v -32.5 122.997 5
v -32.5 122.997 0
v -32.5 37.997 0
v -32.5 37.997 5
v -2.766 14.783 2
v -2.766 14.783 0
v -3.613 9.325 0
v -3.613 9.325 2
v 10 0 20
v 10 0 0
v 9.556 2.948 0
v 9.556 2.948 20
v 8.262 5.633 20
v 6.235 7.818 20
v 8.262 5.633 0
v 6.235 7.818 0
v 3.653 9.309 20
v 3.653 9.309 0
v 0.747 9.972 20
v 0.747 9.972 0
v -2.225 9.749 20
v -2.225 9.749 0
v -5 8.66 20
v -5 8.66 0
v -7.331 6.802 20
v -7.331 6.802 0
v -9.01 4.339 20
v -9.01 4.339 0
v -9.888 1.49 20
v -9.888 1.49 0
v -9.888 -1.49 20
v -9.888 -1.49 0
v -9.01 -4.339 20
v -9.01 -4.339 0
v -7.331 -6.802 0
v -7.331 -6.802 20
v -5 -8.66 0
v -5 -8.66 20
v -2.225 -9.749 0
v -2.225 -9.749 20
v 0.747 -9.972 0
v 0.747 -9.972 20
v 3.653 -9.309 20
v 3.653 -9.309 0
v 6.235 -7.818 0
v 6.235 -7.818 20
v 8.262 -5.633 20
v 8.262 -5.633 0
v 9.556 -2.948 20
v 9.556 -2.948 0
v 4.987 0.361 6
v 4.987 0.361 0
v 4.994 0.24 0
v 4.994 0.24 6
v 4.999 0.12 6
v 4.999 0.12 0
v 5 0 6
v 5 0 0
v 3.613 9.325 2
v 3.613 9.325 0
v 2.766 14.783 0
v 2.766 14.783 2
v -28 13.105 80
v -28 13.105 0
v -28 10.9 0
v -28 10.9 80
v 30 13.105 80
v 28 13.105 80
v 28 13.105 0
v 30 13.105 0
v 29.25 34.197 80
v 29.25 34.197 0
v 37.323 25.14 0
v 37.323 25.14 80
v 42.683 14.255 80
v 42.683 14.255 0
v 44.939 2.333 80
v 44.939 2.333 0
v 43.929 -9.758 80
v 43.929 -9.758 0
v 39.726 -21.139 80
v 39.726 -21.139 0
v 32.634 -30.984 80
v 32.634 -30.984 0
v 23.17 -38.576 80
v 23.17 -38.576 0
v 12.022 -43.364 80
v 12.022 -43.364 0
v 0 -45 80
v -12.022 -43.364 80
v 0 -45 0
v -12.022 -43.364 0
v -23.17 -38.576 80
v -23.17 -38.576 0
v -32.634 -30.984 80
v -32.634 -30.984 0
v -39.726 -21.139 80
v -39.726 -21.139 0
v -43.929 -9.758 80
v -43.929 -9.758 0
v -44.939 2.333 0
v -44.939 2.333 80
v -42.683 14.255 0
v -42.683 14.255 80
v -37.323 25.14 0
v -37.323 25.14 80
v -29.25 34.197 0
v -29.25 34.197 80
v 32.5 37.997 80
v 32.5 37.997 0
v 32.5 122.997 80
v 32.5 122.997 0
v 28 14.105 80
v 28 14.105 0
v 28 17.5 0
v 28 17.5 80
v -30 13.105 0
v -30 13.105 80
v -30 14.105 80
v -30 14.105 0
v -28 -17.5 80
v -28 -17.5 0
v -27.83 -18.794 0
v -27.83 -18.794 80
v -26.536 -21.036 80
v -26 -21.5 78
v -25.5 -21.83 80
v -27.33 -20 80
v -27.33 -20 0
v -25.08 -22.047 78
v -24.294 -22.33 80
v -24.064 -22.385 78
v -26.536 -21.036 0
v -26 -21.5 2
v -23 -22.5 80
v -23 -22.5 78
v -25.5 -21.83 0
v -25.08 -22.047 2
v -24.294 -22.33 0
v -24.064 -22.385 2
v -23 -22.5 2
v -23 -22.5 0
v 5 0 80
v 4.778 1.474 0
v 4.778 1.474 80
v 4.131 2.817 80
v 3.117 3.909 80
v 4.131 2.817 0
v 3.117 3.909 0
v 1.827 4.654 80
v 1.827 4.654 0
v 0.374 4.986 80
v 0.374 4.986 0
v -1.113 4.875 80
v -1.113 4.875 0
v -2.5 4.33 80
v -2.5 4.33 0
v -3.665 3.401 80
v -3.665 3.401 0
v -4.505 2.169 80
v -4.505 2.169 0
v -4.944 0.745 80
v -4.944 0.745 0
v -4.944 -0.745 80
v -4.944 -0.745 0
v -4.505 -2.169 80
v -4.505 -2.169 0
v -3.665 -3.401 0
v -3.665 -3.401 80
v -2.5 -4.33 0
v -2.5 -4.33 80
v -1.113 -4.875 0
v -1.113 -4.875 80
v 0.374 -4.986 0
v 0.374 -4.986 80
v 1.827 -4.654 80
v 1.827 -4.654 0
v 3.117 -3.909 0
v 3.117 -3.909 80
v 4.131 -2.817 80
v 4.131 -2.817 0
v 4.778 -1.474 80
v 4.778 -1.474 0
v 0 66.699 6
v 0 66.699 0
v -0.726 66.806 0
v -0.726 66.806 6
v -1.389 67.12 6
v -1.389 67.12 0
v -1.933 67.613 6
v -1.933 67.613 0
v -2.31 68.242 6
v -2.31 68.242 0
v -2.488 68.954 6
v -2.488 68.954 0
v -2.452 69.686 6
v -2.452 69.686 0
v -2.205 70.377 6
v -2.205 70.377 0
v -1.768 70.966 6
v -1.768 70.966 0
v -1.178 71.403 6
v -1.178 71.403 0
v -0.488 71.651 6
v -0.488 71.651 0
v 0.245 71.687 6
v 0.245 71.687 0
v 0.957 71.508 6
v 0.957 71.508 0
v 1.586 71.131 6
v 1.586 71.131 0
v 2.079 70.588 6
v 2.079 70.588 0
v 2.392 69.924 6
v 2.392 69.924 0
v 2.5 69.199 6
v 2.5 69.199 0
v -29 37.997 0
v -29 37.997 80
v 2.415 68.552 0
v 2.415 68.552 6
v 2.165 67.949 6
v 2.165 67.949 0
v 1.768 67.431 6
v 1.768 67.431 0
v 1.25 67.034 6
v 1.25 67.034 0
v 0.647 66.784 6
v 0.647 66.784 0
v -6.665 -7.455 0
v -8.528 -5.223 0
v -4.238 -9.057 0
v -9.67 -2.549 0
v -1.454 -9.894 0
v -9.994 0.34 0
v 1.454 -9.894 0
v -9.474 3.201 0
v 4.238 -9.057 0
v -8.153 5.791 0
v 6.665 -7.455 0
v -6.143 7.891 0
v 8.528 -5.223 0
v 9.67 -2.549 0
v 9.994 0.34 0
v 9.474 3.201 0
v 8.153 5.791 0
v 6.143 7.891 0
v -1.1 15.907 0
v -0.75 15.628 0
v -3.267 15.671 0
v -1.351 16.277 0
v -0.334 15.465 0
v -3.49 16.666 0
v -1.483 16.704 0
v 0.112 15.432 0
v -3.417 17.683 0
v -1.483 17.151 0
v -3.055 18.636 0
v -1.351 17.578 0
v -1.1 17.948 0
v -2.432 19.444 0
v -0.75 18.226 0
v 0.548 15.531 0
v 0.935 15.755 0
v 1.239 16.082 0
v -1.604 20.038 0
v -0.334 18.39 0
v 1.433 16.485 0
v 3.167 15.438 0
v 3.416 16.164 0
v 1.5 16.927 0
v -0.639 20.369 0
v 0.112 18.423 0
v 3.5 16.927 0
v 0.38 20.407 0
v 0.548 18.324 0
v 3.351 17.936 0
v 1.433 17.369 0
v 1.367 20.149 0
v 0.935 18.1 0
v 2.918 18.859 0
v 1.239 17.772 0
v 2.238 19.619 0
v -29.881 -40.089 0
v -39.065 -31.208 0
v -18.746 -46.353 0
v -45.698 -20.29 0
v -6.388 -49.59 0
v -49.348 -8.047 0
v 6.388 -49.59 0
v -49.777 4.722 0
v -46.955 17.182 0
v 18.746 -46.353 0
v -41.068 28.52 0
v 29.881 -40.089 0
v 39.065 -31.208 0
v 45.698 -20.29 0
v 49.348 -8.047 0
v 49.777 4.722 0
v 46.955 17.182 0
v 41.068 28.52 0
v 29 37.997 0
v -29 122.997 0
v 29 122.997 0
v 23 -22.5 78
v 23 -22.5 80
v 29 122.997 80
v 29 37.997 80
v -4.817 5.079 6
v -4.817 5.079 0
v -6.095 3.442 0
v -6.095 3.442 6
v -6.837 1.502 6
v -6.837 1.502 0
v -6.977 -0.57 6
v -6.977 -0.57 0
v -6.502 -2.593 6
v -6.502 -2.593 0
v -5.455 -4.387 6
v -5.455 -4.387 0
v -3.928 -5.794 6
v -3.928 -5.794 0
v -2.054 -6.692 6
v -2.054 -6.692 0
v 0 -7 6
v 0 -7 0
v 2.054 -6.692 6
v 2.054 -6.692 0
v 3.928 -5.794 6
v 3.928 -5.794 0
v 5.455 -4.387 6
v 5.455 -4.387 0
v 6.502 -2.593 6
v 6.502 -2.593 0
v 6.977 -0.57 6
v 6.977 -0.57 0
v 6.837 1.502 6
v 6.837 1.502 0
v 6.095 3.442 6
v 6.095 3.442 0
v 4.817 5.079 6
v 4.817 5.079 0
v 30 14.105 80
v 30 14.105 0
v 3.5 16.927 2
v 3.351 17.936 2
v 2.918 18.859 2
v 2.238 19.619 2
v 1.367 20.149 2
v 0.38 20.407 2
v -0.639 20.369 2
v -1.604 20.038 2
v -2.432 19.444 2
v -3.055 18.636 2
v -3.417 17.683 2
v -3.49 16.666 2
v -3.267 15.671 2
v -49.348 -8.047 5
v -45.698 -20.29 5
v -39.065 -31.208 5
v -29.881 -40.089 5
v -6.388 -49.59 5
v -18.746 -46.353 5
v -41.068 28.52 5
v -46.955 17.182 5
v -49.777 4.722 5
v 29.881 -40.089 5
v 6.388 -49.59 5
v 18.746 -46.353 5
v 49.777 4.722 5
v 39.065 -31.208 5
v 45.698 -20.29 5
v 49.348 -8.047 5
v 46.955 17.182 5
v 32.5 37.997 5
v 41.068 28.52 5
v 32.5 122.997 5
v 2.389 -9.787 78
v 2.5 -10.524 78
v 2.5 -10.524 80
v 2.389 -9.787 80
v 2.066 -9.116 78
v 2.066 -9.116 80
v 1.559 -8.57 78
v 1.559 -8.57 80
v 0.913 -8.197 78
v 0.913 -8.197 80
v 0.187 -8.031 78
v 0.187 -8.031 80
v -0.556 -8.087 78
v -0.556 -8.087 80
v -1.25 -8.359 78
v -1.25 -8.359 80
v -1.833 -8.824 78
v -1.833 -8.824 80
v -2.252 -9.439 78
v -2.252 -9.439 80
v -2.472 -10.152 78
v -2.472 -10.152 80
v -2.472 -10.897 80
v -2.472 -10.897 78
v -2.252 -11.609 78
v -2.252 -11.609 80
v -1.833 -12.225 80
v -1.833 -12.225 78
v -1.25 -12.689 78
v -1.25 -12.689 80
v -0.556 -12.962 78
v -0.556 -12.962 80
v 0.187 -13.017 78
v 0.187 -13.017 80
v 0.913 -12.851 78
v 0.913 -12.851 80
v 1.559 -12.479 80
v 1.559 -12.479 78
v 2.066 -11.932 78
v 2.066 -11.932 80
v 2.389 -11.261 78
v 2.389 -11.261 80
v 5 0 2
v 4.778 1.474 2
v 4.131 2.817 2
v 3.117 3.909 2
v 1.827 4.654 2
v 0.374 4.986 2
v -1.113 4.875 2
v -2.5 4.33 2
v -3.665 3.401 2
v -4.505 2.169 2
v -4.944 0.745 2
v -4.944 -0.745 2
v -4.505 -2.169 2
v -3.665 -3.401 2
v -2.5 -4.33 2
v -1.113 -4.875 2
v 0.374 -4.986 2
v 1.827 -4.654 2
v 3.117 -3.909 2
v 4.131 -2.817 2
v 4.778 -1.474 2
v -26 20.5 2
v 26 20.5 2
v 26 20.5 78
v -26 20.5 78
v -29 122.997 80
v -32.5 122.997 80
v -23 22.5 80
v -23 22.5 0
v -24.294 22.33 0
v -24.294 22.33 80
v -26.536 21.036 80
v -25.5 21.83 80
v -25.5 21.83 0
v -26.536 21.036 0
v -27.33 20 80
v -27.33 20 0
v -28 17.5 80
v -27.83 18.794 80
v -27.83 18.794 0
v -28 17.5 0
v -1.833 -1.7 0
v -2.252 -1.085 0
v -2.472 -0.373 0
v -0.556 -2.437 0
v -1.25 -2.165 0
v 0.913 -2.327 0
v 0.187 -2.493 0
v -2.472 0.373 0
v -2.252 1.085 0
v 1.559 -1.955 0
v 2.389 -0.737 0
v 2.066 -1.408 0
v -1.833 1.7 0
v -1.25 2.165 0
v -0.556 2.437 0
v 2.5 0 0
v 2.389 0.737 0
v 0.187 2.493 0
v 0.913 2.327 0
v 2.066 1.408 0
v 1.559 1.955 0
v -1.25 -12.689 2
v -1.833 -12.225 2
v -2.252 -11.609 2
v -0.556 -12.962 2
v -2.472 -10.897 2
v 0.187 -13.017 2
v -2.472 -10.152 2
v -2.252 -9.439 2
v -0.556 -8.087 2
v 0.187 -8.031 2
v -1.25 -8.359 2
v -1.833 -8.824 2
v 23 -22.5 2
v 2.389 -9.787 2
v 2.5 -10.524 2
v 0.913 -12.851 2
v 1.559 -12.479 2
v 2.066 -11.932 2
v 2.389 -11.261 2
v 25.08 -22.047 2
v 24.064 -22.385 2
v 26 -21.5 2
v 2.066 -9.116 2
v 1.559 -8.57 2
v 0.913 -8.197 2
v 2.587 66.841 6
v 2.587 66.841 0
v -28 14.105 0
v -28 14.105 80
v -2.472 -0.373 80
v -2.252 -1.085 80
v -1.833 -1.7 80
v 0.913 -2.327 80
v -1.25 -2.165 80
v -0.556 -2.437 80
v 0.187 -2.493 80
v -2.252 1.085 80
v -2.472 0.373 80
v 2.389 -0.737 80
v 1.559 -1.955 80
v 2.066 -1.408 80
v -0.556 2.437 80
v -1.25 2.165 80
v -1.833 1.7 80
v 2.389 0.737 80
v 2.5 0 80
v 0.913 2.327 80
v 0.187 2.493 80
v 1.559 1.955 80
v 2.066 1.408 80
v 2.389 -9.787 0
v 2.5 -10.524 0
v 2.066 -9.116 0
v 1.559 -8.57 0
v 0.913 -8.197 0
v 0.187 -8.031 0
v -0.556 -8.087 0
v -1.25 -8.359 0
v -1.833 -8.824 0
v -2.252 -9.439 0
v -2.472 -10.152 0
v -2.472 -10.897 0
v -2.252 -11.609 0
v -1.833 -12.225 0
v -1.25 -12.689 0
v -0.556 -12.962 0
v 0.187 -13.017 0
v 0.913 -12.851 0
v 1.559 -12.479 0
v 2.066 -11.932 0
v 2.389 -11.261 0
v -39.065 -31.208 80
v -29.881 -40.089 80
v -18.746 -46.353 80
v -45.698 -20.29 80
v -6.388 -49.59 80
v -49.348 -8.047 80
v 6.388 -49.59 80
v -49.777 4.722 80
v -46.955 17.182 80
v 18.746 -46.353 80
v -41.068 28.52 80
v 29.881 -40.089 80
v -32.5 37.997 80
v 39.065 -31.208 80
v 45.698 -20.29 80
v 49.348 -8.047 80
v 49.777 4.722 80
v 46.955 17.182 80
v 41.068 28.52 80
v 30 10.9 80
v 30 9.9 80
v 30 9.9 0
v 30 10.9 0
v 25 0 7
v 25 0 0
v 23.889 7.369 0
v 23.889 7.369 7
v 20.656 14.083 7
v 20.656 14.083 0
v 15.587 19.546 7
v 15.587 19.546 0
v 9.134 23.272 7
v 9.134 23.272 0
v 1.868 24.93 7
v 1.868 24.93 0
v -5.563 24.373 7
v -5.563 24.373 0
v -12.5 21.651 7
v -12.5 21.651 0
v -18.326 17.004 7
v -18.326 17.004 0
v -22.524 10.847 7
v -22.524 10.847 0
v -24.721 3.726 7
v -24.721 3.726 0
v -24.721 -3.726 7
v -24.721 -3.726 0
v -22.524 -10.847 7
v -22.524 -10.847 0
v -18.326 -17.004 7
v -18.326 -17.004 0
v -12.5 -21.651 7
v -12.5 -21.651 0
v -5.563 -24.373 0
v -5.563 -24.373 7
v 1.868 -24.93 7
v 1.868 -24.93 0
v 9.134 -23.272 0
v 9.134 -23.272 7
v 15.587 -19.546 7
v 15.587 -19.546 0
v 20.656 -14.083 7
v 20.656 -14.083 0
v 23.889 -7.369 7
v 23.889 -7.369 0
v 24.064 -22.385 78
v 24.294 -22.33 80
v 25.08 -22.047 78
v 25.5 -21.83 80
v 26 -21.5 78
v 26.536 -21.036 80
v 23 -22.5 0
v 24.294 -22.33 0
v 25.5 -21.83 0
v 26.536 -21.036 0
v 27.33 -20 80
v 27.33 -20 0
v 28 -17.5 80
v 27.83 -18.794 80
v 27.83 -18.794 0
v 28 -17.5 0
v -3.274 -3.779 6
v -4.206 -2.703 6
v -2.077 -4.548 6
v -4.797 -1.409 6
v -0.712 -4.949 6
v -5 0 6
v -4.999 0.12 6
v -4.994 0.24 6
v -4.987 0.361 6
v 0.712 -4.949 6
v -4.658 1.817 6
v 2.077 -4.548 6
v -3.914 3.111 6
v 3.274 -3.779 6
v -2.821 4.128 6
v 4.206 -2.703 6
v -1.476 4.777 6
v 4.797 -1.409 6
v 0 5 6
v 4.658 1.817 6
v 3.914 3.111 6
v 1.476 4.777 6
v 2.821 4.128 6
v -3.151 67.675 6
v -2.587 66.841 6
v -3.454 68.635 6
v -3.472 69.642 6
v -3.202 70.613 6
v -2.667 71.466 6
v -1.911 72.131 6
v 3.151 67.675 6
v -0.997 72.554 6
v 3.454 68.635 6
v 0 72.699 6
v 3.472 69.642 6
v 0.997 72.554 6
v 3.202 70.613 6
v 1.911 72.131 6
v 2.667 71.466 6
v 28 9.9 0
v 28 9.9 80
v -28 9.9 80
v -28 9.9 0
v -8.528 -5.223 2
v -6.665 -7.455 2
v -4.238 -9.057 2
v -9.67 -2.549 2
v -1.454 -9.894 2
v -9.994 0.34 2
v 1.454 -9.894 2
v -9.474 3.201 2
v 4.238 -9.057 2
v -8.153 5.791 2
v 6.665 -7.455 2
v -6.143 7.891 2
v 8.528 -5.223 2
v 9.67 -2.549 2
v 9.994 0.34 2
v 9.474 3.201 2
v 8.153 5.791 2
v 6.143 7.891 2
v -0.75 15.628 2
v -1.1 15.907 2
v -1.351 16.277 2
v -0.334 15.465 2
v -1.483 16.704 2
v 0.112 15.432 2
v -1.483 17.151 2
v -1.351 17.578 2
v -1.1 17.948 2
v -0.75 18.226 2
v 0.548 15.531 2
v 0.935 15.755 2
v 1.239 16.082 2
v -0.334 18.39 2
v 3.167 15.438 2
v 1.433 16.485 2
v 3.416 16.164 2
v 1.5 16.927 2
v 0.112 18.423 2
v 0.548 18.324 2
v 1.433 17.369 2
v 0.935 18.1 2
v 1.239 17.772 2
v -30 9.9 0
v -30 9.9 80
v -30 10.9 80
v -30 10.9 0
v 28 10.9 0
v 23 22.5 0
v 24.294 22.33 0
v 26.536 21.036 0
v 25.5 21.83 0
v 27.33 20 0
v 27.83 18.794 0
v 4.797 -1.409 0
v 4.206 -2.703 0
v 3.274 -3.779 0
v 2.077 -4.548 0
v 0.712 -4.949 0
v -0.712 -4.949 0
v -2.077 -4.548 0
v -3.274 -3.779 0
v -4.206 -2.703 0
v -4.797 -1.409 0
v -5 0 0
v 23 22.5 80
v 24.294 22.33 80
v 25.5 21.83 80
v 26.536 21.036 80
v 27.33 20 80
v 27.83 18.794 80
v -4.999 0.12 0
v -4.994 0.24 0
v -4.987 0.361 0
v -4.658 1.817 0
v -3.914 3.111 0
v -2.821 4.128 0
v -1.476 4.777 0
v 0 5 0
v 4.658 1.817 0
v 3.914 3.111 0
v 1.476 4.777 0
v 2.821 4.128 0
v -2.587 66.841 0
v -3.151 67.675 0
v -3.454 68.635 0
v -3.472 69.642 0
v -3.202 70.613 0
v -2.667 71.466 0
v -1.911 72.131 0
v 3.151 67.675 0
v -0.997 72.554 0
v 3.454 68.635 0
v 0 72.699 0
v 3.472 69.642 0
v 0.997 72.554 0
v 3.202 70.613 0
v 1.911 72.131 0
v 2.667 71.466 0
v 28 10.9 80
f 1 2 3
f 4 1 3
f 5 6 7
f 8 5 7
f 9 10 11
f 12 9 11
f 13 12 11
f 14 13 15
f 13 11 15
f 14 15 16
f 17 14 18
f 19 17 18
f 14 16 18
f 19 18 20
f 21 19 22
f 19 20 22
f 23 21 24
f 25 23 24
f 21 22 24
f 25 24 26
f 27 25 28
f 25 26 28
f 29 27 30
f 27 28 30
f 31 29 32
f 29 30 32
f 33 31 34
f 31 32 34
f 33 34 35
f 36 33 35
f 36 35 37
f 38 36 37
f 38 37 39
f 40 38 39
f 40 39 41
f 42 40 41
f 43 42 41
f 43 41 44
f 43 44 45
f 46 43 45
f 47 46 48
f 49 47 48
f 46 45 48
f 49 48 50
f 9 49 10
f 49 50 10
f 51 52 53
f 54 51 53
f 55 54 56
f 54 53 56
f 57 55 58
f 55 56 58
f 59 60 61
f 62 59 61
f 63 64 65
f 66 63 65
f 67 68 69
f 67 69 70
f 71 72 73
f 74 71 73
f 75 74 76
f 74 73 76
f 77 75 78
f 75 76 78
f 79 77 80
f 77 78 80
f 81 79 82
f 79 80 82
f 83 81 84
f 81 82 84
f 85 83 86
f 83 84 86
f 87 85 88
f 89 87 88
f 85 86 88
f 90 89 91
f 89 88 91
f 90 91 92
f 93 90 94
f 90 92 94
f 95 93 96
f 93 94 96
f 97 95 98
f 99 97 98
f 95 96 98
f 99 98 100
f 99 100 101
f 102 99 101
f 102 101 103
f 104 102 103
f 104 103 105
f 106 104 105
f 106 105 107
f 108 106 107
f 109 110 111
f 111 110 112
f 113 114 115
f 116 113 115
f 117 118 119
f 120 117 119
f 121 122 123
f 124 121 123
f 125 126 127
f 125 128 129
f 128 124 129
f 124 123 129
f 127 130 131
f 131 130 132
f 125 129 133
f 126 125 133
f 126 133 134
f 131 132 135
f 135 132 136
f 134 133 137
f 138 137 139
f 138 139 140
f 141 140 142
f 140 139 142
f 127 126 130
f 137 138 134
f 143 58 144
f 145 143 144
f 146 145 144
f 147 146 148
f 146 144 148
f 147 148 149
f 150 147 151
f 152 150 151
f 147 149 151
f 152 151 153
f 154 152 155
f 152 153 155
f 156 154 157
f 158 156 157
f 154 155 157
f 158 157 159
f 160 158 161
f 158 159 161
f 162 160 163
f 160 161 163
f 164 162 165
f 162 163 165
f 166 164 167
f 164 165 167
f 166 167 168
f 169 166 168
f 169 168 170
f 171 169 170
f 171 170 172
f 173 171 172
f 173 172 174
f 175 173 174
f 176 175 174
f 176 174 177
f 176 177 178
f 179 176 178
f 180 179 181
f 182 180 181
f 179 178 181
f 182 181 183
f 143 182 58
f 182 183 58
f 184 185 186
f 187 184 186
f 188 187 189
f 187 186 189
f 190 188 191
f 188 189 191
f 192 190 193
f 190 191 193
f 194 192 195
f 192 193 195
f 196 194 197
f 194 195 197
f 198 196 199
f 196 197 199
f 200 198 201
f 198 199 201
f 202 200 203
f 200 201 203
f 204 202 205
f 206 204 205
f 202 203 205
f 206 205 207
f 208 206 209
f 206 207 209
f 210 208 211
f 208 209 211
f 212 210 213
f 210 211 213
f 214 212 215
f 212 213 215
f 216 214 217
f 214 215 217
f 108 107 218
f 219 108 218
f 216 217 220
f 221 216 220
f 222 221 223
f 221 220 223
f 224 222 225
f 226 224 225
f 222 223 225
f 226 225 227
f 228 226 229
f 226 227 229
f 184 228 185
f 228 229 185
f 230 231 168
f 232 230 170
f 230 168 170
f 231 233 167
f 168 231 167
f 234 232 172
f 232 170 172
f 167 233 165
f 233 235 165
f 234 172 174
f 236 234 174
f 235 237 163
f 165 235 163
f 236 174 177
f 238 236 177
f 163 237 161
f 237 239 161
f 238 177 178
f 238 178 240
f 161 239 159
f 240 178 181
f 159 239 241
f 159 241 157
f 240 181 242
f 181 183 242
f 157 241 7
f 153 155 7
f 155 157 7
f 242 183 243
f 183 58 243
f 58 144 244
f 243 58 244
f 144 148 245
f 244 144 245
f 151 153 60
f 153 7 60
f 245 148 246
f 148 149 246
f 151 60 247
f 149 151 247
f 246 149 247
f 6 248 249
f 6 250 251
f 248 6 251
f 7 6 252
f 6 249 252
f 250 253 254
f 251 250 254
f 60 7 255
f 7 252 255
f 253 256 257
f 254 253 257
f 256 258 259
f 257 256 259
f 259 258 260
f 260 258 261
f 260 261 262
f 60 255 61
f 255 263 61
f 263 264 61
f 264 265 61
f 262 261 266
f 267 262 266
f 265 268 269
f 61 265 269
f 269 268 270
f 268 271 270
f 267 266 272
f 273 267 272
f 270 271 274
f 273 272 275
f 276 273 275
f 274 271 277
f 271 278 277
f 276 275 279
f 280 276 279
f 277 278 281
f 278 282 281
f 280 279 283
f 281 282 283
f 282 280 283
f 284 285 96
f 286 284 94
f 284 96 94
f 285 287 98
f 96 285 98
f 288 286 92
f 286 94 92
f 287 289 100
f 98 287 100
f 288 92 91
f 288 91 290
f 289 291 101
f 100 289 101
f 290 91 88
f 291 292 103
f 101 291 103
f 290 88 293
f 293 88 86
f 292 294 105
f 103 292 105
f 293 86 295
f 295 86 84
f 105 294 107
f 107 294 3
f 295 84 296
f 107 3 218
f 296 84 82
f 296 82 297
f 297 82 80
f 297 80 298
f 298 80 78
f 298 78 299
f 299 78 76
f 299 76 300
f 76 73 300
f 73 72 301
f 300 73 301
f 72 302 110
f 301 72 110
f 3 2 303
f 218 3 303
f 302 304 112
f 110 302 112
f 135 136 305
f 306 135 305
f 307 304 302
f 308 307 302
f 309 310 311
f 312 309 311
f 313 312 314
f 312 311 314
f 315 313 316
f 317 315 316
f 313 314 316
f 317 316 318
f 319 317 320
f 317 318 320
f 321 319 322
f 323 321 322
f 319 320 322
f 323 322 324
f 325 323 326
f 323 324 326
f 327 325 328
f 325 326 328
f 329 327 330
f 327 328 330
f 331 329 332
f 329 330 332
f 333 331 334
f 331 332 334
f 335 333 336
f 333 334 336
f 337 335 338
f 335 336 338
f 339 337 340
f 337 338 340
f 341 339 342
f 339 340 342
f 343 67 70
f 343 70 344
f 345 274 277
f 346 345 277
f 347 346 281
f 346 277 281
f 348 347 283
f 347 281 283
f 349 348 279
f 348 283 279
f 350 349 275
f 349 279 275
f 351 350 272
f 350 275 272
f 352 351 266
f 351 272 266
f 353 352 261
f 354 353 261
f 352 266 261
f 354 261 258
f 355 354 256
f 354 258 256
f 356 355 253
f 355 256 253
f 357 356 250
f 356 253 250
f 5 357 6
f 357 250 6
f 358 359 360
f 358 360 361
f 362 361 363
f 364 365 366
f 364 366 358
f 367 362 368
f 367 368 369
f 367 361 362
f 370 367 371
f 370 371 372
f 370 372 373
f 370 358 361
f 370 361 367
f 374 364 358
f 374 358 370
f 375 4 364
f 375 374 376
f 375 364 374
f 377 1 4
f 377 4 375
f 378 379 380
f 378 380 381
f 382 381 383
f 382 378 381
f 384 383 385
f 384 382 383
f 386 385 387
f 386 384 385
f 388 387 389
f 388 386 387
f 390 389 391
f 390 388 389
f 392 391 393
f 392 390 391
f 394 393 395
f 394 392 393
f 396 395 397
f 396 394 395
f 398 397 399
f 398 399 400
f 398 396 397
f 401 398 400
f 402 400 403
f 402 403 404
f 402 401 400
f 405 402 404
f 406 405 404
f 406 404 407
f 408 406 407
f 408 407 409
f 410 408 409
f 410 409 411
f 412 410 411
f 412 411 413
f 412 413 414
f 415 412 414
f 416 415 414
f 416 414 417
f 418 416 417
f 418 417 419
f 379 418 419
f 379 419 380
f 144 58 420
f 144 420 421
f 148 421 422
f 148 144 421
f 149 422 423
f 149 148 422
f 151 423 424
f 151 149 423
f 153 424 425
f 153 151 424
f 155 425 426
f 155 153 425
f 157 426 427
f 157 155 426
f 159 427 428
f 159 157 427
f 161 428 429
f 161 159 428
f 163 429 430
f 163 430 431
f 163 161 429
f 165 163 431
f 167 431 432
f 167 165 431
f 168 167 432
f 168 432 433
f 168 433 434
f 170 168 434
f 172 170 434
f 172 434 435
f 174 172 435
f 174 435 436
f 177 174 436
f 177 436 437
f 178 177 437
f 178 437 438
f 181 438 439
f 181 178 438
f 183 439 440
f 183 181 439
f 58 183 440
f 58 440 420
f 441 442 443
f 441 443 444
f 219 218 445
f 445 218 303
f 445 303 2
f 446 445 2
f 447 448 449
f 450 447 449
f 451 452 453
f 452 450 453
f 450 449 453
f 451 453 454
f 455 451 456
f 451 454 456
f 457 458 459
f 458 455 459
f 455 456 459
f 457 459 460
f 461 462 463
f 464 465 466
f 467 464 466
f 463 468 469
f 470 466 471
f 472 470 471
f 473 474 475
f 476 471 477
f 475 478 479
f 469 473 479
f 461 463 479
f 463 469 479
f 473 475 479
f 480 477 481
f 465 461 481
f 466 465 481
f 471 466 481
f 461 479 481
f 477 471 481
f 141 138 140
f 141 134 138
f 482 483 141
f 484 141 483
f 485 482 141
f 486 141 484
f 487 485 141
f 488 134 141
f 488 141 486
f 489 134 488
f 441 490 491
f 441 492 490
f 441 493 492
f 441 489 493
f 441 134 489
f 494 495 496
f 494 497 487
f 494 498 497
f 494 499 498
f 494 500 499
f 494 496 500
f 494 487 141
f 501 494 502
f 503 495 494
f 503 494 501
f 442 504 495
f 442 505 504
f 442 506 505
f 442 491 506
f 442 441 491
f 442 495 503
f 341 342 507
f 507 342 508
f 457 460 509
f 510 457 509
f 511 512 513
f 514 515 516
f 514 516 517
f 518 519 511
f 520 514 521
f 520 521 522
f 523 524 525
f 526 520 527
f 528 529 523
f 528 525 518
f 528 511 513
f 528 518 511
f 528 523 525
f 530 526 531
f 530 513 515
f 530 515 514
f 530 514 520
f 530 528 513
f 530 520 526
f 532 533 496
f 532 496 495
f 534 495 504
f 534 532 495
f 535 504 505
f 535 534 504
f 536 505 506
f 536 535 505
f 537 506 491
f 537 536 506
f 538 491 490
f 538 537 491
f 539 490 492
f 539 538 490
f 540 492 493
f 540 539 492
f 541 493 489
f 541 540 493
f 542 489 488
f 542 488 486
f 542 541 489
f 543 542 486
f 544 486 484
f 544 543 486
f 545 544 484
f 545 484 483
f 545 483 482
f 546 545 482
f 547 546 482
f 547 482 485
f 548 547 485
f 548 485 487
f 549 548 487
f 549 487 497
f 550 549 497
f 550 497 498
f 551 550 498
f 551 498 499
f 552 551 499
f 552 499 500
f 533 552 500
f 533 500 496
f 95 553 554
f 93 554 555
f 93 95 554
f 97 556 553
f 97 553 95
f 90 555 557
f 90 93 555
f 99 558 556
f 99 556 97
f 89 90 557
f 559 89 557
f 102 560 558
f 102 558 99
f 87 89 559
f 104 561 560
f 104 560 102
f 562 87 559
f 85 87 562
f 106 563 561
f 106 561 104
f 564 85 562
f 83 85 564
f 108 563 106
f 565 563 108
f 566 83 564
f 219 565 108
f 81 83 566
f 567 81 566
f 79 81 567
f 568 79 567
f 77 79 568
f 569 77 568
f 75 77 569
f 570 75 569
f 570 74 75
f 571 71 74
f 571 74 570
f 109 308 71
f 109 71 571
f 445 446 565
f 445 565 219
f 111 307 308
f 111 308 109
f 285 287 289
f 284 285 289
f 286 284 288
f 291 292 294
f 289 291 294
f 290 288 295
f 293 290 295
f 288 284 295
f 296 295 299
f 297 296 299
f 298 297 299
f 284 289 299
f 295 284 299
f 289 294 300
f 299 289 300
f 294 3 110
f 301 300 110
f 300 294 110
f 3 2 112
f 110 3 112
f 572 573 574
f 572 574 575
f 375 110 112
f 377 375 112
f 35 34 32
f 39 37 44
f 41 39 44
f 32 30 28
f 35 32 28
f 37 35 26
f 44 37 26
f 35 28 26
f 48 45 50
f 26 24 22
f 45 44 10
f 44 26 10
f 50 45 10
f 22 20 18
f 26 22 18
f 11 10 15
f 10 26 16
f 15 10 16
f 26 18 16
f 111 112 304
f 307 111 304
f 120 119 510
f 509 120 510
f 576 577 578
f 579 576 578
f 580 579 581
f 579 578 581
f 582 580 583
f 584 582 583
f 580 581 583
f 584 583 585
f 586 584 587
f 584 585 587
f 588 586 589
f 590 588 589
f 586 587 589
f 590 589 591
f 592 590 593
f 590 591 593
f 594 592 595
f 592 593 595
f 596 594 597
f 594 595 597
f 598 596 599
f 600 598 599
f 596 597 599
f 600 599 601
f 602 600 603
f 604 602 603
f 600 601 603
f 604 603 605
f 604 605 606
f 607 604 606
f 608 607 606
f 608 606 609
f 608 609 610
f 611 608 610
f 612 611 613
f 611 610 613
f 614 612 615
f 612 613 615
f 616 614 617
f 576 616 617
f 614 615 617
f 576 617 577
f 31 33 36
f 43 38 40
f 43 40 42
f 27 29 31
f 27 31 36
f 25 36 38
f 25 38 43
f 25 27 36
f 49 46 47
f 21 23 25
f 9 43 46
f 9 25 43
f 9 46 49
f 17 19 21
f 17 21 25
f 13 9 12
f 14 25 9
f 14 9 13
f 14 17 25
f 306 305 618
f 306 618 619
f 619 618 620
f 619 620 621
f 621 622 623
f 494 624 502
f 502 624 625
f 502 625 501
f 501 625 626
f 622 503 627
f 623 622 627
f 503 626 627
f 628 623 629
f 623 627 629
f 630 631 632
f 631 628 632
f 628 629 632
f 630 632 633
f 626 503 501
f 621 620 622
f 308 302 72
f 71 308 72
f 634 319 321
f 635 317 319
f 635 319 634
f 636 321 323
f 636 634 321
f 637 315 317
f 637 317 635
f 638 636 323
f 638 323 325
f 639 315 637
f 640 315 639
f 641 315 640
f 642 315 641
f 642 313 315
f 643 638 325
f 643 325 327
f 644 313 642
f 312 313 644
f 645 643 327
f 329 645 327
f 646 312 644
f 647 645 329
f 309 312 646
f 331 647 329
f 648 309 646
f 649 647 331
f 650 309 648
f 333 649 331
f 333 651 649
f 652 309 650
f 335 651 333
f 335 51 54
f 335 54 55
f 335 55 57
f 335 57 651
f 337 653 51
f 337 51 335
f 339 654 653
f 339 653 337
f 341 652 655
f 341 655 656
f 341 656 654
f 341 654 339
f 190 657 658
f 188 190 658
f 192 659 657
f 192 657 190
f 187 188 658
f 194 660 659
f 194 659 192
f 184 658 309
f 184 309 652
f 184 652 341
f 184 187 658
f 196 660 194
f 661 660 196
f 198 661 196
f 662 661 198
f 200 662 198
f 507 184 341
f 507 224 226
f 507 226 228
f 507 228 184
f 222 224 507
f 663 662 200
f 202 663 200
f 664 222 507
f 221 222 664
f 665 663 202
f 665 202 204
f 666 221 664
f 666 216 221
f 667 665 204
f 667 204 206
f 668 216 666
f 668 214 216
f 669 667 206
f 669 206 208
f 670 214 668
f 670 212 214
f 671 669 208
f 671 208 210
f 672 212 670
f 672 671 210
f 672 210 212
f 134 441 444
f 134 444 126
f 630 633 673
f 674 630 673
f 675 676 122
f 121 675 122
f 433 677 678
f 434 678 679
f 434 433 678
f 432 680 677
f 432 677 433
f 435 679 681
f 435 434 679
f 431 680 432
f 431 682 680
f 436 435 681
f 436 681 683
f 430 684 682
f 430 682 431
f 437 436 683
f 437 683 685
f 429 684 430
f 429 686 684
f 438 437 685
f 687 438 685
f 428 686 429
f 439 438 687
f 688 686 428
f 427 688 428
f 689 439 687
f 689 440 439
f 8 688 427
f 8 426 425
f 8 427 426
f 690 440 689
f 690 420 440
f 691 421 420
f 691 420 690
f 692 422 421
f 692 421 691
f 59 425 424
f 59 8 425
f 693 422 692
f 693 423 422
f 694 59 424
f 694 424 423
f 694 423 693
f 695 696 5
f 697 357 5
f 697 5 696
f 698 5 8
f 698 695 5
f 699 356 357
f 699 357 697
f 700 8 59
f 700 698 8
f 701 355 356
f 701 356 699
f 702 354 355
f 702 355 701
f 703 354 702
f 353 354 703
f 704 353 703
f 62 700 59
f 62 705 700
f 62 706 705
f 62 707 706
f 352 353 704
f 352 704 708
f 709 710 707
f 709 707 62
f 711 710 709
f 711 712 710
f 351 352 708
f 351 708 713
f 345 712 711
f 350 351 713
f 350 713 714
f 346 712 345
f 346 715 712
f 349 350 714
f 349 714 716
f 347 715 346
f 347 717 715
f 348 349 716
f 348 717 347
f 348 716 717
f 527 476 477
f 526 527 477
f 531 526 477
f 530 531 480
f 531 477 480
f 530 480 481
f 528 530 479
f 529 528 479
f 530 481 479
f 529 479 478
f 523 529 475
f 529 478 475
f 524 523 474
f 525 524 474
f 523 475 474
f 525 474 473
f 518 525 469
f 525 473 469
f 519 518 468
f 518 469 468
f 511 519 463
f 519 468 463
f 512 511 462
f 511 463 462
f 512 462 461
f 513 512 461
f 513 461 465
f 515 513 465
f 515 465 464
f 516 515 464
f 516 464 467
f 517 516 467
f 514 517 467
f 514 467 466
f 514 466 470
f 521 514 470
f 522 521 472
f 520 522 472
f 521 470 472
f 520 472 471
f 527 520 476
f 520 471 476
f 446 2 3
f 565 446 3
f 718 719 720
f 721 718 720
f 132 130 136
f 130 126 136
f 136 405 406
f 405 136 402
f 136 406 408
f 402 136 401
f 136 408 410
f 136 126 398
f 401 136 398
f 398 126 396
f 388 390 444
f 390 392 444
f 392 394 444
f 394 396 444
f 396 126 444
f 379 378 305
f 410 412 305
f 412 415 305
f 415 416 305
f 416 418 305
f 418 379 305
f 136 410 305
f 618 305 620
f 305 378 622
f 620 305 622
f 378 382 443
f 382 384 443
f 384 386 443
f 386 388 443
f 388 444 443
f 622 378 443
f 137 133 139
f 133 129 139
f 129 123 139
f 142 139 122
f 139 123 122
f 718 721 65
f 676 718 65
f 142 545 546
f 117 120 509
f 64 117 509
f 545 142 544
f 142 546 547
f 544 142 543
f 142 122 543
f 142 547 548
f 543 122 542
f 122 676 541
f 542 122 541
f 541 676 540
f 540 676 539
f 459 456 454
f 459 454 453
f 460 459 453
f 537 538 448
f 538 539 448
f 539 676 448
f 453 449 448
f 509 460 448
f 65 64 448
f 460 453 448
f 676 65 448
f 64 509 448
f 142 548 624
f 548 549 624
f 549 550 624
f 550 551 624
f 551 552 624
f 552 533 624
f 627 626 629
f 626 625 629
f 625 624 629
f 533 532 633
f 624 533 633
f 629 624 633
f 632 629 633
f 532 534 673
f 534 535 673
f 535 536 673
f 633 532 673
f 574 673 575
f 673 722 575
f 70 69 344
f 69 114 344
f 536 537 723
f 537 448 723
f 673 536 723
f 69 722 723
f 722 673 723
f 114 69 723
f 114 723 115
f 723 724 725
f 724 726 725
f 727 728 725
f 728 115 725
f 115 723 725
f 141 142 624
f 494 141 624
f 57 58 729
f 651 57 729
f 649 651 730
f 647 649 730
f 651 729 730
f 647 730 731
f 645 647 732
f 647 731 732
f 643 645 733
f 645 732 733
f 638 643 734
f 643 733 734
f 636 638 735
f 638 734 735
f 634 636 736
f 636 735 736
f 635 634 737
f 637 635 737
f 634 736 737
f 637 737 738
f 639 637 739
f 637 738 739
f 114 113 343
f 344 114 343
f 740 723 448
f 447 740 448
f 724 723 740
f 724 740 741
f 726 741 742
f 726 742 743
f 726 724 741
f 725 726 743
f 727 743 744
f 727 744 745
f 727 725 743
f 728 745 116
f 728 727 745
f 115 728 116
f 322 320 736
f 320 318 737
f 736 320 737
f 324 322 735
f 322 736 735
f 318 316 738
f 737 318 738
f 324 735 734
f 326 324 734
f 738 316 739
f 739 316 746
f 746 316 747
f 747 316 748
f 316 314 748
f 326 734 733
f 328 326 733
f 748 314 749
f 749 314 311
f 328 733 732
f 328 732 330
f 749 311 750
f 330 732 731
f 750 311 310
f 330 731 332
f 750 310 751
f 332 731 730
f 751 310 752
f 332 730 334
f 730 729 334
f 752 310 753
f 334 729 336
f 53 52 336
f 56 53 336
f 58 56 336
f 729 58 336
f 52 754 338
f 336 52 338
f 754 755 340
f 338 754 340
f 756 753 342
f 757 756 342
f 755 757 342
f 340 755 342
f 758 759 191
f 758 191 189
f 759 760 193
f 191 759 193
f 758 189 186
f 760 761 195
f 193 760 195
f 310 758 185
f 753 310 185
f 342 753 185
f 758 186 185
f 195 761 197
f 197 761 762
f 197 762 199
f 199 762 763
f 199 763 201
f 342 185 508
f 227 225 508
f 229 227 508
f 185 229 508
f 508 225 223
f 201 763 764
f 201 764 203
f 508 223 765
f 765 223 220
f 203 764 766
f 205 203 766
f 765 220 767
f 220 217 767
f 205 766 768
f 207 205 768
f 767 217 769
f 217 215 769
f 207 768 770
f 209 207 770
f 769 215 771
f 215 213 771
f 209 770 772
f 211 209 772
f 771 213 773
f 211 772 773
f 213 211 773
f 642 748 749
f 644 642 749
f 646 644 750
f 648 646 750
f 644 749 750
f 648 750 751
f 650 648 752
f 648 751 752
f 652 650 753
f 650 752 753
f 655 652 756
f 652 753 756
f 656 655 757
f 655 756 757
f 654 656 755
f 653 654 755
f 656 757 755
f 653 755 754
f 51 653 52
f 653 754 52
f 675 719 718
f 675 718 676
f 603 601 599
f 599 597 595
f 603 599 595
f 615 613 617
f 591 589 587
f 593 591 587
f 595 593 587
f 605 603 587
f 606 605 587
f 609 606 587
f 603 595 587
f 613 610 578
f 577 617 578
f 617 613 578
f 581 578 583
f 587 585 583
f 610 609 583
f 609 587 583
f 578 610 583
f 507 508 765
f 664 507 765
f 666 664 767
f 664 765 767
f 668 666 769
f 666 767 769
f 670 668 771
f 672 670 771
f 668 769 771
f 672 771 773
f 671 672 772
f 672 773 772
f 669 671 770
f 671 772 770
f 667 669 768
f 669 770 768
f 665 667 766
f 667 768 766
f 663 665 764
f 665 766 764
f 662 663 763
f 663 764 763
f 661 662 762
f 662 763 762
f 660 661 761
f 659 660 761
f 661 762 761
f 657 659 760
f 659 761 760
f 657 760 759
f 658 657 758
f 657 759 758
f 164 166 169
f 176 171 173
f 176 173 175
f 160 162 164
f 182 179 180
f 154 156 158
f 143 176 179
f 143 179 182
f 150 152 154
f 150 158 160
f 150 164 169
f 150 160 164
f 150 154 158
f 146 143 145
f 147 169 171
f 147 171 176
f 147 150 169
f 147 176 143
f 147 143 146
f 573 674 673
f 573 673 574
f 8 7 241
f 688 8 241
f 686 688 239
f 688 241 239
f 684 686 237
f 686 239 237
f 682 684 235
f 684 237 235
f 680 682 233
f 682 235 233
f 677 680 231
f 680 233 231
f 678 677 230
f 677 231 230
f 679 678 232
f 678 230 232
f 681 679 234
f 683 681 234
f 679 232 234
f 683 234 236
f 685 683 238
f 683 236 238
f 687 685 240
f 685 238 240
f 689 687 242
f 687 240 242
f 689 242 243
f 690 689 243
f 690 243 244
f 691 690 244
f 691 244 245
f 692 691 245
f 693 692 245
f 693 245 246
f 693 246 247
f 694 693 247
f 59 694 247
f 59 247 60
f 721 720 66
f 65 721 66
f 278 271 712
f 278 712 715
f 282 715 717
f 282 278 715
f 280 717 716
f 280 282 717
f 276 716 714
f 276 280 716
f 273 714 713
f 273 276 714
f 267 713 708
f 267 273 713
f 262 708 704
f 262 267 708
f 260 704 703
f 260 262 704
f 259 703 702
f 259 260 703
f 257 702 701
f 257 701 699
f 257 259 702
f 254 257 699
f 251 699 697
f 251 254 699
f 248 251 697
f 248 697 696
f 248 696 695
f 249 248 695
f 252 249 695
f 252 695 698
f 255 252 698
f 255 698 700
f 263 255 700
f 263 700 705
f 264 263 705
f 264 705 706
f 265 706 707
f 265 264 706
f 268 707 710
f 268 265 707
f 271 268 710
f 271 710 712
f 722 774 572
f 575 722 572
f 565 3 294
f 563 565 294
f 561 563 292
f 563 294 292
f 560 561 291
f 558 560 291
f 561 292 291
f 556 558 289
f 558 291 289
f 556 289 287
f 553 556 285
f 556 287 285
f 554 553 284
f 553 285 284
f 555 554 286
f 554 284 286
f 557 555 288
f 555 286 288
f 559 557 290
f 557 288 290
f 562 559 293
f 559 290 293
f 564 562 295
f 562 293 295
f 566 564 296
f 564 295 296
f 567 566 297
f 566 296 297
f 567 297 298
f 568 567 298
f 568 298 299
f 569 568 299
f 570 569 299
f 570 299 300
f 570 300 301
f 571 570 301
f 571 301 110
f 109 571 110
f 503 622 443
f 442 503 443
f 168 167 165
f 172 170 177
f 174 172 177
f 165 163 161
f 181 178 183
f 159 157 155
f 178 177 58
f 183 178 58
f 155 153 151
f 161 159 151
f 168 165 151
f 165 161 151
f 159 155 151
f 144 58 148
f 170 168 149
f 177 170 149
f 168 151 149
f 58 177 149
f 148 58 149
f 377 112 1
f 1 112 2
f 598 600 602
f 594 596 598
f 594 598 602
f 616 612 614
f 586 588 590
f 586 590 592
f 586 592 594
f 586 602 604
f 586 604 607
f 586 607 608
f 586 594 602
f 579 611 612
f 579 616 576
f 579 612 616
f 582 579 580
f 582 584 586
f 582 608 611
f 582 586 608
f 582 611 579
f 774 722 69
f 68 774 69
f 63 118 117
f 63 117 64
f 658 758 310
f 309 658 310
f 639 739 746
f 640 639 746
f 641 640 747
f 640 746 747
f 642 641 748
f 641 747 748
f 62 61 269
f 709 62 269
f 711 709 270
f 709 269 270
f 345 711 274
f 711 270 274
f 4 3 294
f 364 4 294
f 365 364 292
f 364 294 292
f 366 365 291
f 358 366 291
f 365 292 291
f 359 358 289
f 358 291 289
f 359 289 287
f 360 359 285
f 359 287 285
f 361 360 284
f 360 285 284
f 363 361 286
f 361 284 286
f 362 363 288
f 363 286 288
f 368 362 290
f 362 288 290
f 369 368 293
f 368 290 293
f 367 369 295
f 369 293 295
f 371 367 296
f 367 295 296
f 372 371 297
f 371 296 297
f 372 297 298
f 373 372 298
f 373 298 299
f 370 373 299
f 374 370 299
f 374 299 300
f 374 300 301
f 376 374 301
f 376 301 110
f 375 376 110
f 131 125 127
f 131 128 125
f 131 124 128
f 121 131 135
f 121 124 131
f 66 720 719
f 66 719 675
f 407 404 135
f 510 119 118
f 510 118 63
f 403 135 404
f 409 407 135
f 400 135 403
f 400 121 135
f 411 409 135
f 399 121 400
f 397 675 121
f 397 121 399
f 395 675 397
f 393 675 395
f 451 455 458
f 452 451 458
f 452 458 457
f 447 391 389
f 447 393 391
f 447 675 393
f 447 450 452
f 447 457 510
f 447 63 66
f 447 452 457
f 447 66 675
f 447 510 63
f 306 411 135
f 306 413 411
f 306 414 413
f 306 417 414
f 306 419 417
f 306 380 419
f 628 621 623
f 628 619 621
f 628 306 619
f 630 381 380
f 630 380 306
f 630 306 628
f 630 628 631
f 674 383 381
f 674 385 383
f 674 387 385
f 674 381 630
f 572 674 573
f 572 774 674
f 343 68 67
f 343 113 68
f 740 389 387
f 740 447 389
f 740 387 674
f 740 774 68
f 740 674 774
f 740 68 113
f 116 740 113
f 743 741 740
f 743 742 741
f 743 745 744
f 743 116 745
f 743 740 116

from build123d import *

# Parameters (mm, degrees)
F1_DEPTH     = 80
F3_DEPTH     = 5
F4_R         = 5
F5_DEPTH     = 80
F7_R         = 25
F8_DEPTH     = 7
F10_DEPTH    = 6
F6_R         = 5
F6_R_2       = 1.5
F11_DEPTH    = 2
F12_R        = 2.5
F12_W        = 2
F12_H        = 1
F13_DEPTH    = 80
F14_T        = 2
F14_T3_DEPTH = 84
F15_T1_DEPTH = 105
F16_R        = 2.5
F17_DEPTH    = 80
F18_R        = 10
F19_DEPTH    = 20


# Not quite as in the source:
# - a fillet or chamfer that OpenCascade refuses, or shapes differently, is made with other operations: its cross-section is extruded or revolved along the edge and cut away or added
# - a shell that OpenCascade refuses in one call is made with other operations: the cavity is built on its own and cut out


with BuildPart() as f1:
    # F0 (on Top) → F1 (new body)
    with BuildSketch(Plane.XY):
        with BuildLine():
            Line((-32.5, 122.9967103839), (-32.5, 37.9967103839))
            ThreePointArc((-32.5, 37.9967103839), (0, -50), (32.5, 37.9967103839))
            Line((32.5, 37.9967103839), (32.5, 122.9967103839))
            Line((32.5, 122.9967103839), (29, 122.9967103839))
            Line((29, 122.9967103839), (29, 37.9967103839))
            Line((29, 37.9967103839), (29.25, 34.1970393455))
            ThreePointArc((29.25, 34.1970393455), (0, -45), (-29.25, 34.1970393455))
            Line((-29.25, 34.1970393455), (-29, 37.9967103839))
            Line((-29, 37.9967103839), (-29, 122.9967103839))
            Line((-29, 122.9967103839), (-32.5, 122.9967103839))
        make_face()
    extrude(amount=F1_DEPTH)


with BuildPart() as f3:
    # F2 (on Top) → F3 (new body)
    with BuildSketch(Plane.XY):
        with BuildLine():
            Line((-32.5, 122.9967103839), (-32.5, 37.9967103839))
            ThreePointArc((-32.5, 37.9967103839), (0, -50), (32.5, 37.9967103839))
            Line((32.5, 37.9967103839), (32.5, 122.9967103839))
            Line((32.5, 122.9967103839), (-32.5, 122.9967103839))
        make_face()
    extrude(amount=F3_DEPTH)


with BuildPart() as f5:
    # F4 (on Top) → F5 (new body)
    with BuildSketch(Plane.XY):
        Circle(F4_R)
    extrude(amount=F5_DEPTH)


with BuildPart() as f8:
    # F7 (on Top) → F8 (new body)
    with BuildSketch(Plane.XY):
        Circle(F7_R)
    extrude(amount=F8_DEPTH)


with BuildPart() as f10:
    # F9 (on Top) → F10 (new body)
    with BuildSketch(Plane.XY):
        with BuildLine():
            Line((4.8166118904, 5.0793946389), (2.5867517761, 66.8409752222))
            ThreePointArc((2.5867517761, 66.8409752222), (0, 72.6986680031), (-2.5867517761, 66.8409752222))
            Line((-2.5867517761, 66.8409752222), (-4.8166118904, 5.0793946389))
            ThreePointArc((-4.8166118904, 5.0793946389), (0, -7), (4.8166118904, 5.0793946389))
        make_face()
        with BuildLine():
            ThreePointArc((4.9869817475, 0.3605732245), (4.996744377, 0.1804040778), (5, 0))
            ThreePointArc((5, 0), (0, -5), (-5, 0))
            ThreePointArc((-5, 0), (-4.996744377, 0.1804040778), (-4.9869817475, 0.3605732245))
            ThreePointArc((-4.9869817475, 0.3605732245), (0, 5), (4.9869817475, 0.3605732245))
        make_face(mode=Mode.SUBTRACT)
        with BuildLine():
            ThreePointArc((0, 66.6986680031), (-1.767766953, 70.966434956), (2.5, 69.1986680031))
            ThreePointArc((2.5, 69.1986680031), (1.767766953, 67.4309010501), (0, 66.6986680031))
        make_face(mode=Mode.SUBTRACT)
    extrude(amount=F10_DEPTH)


with BuildPart() as f11:
    # F6 (on Top) → F11 (new body)
    with BuildSketch(Plane.XY):
        with BuildLine():
            ThreePointArc((-3.6129275124, 9.3245243734), (-5.6511381542, -8.2501295482), (10, 0))
            ThreePointArc((10, 0), (8.2501295482, 5.6511381542), (3.6129275124, 9.3245243734))
            ThreePointArc((3.6129275124, 9.3245243734), (0, 10), (-3.6129275124, 9.3245243734))
        make_face()
        Circle(F6_R, mode=Mode.SUBTRACT)
        with BuildLine():
            ThreePointArc((-3.6129275124, 9.3245243734), (0, 10), (3.6129275124, 9.3245243734))
            Line((3.6129275124, 9.3245243734), (2.7659637974, 14.7827281256))
            ThreePointArc((2.7659637974, 14.7827281256), (0, 13.4273596257), (-2.7659637974, 14.7827281256))
            Line((-2.7659637974, 14.7827281256), (-3.6129275124, 9.3245243734))
        make_face()
        with BuildLine():
            ThreePointArc((-2.7659637974, 14.7827281256), (0, 13.4273596257), (2.7659637974, 14.7827281256))
            ThreePointArc((2.7659637974, 14.7827281256), (3.3114100691, 15.7939738333), (3.5, 16.9273596257))
            ThreePointArc((3.5, 16.9273596257), (-1.1333857924, 20.2387696948), (-2.7659637974, 14.7827281256))
        make_face()
        with Locations((0, 16.9273596257)):
            Circle(F6_R_2, mode=Mode.SUBTRACT)
    extrude(amount=F11_DEPTH)


with BuildPart() as f13:
    # F12 (on Top) → F13 (new body)
    with BuildSketch(Plane.XY):
        Polygon((28, 22.5), (-28, 22.5), (-28, 14.1049482152), (-28, 13.1049482152), (-28, 10.9004797414), (-28, 9.9004797414), (-28, -22.5), (28, -22.5), (28, 9.9004797414), (28, 10.9004797414), (28, 13.1049482152), (28, 14.1049482152), align=None)
        with Locations((0, -10.5241974816)):
            Circle(F12_R, mode=Mode.SUBTRACT)
        with Locations((-29, 13.6049482152)):
            Rectangle(F12_W, F12_H)
        with Locations((-29, 10.4004797414)):
            Rectangle(F12_W, F12_H)
        with Locations((29, 13.6049482152)):
            Rectangle(F12_W, F12_H)
        with Locations((29, 10.4004797414)):
            Rectangle(F12_W, F12_H)
    extrude(amount=F13_DEPTH)

    # F14: shell of thickness 2, made by hand


with BuildPart() as f14_core1:
    # F14_t2: copy of F13
    add(f13.part)

    # the walls: a layer under each face that stays
    f14_faces = [f14_core1.faces().sort_by_distance(p)[0] for p in [
        (0, 22.5, 40),
        (-28, 18.3024741076, 40),
        (-29, 14.1049482152, 40),
        (-30, 13.6049482152, 40),
        (-29, 13.1049482152, 40),
        (-28, 12.0027139783, 40),
        (-29, 10.9004797414, 40),
        (-30, 10.4004797414, 40),
        (-29, 9.9004797414, 40),
        (-28, -6.2997601293, 40),
        (28, -6.2997601293, 40),
        (29, 9.9004797414, 40),
        (30, 10.4004797414, 40),
        (29, 10.9004797414, 40),
        (28, 12.0027139783, 40),
        (29, 13.1049482152, 40),
        (30, 13.6049482152, 40),
        (29, 14.1049482152, 40),
        (28, 18.3024741076, 40),
        (0, 0, 0),
        (0, 0, 80),
    ]]
    thicken(f14_faces, amount=-F14_T, mode=Mode.SUBTRACT)

    # F14_s4 → F14_t3 (cut)
    with BuildSketch(Plane.XY.offset(-2)):
        Polygon((-28.02, 14.1249482152), (-26, 14.1049482152), (-26, 12.1049482152), (-28, 12.1049482152), align=None)
        Polygon((-28.02, 13.0849482152), (-28, 15.1049482152), (-26, 15.1049482152), (-26, 13.1049482152), align=None)
        Polygon((-28.02, 10.9204797414), (-26, 10.9004797414), (-26, 8.9004797414), (-28, 8.9004797414), align=None)
        Polygon((-28.02, 9.8804797414), (-28, 11.9004797414), (-26, 11.9004797414), (-26, 9.9004797414), align=None)
        Polygon((28.02, 9.8804797414), (26, 9.9004797414), (26, 11.9004797414), (28, 11.9004797414), align=None)
        Polygon((28.02, 10.9204797414), (28, 8.9004797414), (26, 8.9004797414), (26, 10.9004797414), align=None)
        Polygon((28.02, 13.0849482152), (26, 13.1049482152), (26, 15.1049482152), (28, 15.1049482152), align=None)
        Polygon((28.02, 14.1249482152), (28, 12.1049482152), (26, 12.1049482152), (26, 14.1049482152), align=None)
    extrude(amount=F14_T3_DEPTH, mode=Mode.SUBTRACT)


with BuildPart() as f13_1:
    add(f13.part)

    # what is left inside the walls is the cavity
    f14_cavity = [f14_core1.part.solids().sort_by_distance(p)[0] for p in [
        (0, 20.48, 52.666667),
    ]]
    add(f14_cavity, mode=Mode.SUBTRACT)

    # F15: fillet of radius 5 on 4 edges, made by hand

    # F15_s2 → F15_t1 (cut)
    with BuildSketch(Plane.XY.offset(-12.5)):
        with BuildLine():
            ThreePointArc((-23, 22.5), (-26.5355339059, 21.0355339059), (-28, 17.5))
            Line((-28, 17.5), (-28, 22.5))
            Line((-28, 22.5), (-23, 22.5))
        make_face()
        with BuildLine():
            ThreePointArc((23, 22.5), (26.5355339059, 21.0355339059), (28, 17.5))
            Line((28, 17.5), (28, 22.5))
            Line((28, 22.5), (23, 22.5))
        make_face()
        with BuildLine():
            ThreePointArc((23, -22.5), (26.5355339059, -21.0355339059), (28, -17.5))
            Line((28, -17.5), (28, -22.5))
            Line((28, -22.5), (23, -22.5))
        make_face()
        with BuildLine():
            ThreePointArc((-28, -17.5), (-26.5355339059, -21.0355339059), (-23, -22.5))
            Line((-23, -22.5), (-28, -22.5))
            Line((-28, -22.5), (-28, -17.5))
        make_face()
    extrude(amount=F15_T1_DEPTH, mode=Mode.SUBTRACT)


with BuildPart() as f17:
    # F16 (on Top) → F17 (new body)
    with BuildSketch(Plane.XY):
        Circle(F16_R)
    extrude(amount=F17_DEPTH)


with BuildPart() as f19:
    # F18 (on Top) → F19 (new body)
    with BuildSketch(Plane.XY):
        Circle(F18_R)
    extrude(amount=F19_DEPTH)


solid = Compound([f1.part, f3.part, f5.part, f8.part, f10.part, f11.part, f13_1.part, f17.part, f19.part])
